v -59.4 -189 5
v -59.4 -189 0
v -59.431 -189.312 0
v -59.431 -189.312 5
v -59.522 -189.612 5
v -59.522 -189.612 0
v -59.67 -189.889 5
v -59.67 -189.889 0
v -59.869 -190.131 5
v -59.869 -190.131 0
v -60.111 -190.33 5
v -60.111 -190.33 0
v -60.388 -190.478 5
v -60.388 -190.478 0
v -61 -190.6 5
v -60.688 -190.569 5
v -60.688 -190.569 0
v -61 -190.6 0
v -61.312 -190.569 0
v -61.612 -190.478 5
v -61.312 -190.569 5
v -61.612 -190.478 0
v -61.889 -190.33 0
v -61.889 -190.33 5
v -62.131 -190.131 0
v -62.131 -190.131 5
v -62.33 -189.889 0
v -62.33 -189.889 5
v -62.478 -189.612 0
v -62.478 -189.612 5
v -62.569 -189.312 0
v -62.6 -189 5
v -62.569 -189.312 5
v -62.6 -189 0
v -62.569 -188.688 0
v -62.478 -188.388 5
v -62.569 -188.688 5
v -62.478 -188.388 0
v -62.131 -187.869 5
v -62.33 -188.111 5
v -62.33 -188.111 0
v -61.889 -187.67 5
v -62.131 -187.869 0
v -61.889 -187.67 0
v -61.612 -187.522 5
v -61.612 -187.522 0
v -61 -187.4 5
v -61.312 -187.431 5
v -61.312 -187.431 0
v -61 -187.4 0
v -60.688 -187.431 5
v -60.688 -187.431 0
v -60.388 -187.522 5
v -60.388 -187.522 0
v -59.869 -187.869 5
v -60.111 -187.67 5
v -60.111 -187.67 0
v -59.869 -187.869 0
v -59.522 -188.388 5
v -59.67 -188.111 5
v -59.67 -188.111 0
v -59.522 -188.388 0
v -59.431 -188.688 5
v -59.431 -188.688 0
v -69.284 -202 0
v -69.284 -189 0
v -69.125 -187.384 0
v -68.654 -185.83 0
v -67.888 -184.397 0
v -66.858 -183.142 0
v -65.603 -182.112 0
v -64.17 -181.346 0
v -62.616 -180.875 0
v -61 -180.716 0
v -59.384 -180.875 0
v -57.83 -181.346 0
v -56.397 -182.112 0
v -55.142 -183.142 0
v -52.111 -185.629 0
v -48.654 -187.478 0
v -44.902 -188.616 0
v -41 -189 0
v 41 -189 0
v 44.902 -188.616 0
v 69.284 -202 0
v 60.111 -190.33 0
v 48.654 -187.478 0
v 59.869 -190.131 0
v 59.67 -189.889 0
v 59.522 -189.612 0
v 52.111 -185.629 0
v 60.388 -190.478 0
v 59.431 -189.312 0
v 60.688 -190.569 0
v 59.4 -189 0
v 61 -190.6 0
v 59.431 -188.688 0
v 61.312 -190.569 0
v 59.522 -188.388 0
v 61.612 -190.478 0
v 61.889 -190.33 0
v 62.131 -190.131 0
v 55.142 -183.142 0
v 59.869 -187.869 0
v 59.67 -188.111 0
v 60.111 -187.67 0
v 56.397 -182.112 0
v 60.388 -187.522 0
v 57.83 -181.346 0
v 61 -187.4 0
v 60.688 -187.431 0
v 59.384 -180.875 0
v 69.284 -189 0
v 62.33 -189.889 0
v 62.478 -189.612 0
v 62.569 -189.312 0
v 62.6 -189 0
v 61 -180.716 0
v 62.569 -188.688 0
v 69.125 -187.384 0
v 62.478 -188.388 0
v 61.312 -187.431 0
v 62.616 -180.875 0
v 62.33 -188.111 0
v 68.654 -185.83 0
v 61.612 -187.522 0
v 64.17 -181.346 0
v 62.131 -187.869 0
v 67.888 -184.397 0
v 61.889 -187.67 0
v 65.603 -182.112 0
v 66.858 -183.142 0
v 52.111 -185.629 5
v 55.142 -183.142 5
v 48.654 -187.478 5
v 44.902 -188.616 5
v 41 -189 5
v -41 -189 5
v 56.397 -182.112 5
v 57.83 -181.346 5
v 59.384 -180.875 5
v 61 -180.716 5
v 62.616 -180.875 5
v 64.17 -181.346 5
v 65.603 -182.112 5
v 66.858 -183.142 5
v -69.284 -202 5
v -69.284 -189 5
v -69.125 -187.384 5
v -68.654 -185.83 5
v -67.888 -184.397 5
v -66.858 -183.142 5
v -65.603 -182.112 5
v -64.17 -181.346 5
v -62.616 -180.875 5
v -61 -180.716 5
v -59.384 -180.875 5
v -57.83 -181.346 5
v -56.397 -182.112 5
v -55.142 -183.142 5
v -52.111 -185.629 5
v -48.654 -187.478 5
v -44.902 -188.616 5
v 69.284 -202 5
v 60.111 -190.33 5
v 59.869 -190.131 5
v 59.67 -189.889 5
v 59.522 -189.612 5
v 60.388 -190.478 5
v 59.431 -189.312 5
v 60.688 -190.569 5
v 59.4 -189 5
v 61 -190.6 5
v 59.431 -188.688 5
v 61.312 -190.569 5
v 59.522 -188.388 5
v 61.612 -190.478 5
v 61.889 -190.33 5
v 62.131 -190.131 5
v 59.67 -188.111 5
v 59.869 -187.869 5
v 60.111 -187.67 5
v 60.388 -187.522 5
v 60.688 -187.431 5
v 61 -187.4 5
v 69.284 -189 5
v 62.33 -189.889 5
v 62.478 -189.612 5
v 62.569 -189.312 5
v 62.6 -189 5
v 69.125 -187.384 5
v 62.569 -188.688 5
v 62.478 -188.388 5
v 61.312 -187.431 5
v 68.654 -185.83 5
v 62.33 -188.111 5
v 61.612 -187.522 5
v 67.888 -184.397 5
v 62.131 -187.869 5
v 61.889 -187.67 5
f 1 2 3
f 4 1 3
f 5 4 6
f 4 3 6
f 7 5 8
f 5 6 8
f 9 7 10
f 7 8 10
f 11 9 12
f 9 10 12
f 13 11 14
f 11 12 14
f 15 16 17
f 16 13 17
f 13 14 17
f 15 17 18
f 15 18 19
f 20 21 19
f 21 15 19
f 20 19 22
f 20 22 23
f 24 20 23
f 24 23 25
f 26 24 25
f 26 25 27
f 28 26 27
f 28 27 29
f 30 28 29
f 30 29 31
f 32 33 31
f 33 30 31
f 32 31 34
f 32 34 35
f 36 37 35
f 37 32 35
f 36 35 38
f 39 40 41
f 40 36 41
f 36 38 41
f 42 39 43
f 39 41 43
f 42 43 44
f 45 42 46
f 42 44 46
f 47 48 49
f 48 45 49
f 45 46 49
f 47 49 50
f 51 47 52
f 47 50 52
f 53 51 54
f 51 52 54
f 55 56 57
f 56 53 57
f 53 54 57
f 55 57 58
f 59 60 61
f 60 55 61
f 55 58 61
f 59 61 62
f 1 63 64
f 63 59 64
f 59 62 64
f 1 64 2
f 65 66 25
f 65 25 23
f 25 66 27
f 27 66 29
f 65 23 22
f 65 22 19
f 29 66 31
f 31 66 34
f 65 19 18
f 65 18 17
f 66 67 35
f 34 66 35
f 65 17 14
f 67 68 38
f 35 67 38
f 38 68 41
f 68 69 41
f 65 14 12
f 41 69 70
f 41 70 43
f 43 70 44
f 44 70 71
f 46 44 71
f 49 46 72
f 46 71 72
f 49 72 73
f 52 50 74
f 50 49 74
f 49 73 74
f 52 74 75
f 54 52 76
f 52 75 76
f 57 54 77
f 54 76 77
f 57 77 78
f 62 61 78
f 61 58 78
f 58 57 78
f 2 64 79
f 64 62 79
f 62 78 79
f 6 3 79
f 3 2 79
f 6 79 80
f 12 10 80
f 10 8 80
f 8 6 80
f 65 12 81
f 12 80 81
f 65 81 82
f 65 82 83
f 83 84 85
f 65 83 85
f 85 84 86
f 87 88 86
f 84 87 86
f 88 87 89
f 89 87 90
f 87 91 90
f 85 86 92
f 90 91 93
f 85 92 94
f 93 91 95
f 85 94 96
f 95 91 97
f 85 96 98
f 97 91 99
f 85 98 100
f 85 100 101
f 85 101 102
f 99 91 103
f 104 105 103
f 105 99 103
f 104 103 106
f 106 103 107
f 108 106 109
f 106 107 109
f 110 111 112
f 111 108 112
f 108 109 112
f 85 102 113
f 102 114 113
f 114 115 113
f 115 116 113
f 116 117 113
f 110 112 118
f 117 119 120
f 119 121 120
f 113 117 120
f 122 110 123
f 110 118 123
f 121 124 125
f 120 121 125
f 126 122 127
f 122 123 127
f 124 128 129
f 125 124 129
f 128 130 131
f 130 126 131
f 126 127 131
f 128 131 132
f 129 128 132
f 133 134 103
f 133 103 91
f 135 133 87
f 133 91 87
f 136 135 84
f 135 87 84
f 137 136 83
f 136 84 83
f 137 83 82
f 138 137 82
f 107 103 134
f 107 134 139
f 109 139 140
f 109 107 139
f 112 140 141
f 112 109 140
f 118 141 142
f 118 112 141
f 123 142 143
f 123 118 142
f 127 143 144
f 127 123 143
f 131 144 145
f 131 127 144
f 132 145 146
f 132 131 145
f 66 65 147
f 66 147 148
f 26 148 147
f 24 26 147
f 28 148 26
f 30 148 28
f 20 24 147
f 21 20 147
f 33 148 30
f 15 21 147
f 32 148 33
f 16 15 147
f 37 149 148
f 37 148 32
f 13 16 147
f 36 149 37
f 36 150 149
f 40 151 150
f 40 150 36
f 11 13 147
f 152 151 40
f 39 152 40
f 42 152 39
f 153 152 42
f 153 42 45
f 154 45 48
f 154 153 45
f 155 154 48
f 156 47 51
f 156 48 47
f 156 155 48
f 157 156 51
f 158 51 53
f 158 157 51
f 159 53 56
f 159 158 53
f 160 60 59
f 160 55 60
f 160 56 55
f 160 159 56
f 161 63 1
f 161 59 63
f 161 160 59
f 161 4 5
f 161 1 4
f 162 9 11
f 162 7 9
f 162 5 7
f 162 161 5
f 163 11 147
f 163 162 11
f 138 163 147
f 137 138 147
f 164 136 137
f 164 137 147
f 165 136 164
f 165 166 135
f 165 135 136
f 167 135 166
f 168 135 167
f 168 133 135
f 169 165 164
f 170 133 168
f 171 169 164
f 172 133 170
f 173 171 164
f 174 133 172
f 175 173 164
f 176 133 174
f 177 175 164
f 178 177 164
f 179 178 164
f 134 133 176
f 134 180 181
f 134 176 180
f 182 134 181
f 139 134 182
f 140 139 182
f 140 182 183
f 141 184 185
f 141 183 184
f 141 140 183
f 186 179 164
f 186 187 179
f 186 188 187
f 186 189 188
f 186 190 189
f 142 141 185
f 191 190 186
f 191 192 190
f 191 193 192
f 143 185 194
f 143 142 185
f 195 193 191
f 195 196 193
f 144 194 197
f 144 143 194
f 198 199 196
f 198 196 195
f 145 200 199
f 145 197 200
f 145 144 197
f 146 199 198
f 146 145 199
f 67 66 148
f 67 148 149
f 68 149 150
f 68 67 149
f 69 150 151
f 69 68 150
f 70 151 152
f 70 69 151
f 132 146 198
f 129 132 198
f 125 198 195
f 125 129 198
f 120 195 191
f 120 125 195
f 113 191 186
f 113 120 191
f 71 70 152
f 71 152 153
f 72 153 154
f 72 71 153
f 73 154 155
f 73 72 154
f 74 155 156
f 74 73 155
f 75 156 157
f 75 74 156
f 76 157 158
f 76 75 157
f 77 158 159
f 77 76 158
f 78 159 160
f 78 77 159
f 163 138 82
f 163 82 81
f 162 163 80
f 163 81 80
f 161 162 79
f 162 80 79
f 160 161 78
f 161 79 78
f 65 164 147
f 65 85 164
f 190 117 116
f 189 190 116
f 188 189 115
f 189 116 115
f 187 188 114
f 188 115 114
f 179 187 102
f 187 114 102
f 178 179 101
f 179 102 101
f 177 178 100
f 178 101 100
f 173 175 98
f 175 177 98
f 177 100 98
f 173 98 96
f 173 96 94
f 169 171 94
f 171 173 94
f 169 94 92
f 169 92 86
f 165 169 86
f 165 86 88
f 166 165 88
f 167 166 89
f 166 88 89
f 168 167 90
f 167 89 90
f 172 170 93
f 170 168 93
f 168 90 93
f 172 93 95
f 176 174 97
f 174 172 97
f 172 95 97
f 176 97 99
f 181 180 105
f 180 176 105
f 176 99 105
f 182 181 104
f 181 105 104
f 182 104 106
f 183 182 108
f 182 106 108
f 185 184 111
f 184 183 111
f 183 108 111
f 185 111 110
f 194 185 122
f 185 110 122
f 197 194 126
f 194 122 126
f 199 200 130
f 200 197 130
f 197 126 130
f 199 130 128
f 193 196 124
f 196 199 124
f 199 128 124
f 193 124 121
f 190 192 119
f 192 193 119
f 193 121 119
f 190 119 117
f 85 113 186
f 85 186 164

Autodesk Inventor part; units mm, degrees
ref_plane "YZ Plane" through (0, 0, 0) normal (1, 0, 0) x (0, 1, 0)
ref_plane "XZ Plane" through (0, 0, 0) normal (0, 1, 0) x (-1, 0, 0)
ref_plane "XY Plane" through (0, 0, 0) normal (0, 0, 1) x (1, 0, 0)
sketch "スケッチ2" plane through (0, 0, 0) normal (0, 0, 1) x (1, 0, 0)
  circle A0 centre (-61, -189) radius 2.1 construction
  circle A1 centre (61, -189) radius 2.1 construction
  arc A2 (66.8579, -183.1421) -> (55.1421, -183.1421) centre (61, -189) ccw
  arc A3 (41, -189) -> (55.1421, -183.1421) centre (41, -169) ccw
  line L0 (41, -189) -> (-41, -189)
  arc A4 (-55.1421, -183.1421) -> (-41, -189) centre (-41, -169) ccw
  arc A5 (-55.1421, -183.1421) -> (-66.8579, -183.1421) centre (-61, -189) ccw
  arc A6 (69.2843, -189) -> (66.8579, -183.1421) centre (61, -189) ccw
  arc A7 (-66.8579, -183.1421) -> (-69.2843, -189) centre (-61, -189) ccw
  line L1 (69.2843, -189) -> (69.2843, -202)
  line L2 (69.2843, -202) -> (-69.2843, -202)
  line L3 (-69.2843, -202) -> (-69.2843, -189)
  circle A8 centre (61, -189) radius 1.6
  circle A9 centre (-61, -189) radius 1.6
  point P0 (0, 0)
  point P1 (234, -202)
extrude "押し出し1" add sketch "スケッチ2" along normal blind 5
properties part number "radiator_adapter_02"
